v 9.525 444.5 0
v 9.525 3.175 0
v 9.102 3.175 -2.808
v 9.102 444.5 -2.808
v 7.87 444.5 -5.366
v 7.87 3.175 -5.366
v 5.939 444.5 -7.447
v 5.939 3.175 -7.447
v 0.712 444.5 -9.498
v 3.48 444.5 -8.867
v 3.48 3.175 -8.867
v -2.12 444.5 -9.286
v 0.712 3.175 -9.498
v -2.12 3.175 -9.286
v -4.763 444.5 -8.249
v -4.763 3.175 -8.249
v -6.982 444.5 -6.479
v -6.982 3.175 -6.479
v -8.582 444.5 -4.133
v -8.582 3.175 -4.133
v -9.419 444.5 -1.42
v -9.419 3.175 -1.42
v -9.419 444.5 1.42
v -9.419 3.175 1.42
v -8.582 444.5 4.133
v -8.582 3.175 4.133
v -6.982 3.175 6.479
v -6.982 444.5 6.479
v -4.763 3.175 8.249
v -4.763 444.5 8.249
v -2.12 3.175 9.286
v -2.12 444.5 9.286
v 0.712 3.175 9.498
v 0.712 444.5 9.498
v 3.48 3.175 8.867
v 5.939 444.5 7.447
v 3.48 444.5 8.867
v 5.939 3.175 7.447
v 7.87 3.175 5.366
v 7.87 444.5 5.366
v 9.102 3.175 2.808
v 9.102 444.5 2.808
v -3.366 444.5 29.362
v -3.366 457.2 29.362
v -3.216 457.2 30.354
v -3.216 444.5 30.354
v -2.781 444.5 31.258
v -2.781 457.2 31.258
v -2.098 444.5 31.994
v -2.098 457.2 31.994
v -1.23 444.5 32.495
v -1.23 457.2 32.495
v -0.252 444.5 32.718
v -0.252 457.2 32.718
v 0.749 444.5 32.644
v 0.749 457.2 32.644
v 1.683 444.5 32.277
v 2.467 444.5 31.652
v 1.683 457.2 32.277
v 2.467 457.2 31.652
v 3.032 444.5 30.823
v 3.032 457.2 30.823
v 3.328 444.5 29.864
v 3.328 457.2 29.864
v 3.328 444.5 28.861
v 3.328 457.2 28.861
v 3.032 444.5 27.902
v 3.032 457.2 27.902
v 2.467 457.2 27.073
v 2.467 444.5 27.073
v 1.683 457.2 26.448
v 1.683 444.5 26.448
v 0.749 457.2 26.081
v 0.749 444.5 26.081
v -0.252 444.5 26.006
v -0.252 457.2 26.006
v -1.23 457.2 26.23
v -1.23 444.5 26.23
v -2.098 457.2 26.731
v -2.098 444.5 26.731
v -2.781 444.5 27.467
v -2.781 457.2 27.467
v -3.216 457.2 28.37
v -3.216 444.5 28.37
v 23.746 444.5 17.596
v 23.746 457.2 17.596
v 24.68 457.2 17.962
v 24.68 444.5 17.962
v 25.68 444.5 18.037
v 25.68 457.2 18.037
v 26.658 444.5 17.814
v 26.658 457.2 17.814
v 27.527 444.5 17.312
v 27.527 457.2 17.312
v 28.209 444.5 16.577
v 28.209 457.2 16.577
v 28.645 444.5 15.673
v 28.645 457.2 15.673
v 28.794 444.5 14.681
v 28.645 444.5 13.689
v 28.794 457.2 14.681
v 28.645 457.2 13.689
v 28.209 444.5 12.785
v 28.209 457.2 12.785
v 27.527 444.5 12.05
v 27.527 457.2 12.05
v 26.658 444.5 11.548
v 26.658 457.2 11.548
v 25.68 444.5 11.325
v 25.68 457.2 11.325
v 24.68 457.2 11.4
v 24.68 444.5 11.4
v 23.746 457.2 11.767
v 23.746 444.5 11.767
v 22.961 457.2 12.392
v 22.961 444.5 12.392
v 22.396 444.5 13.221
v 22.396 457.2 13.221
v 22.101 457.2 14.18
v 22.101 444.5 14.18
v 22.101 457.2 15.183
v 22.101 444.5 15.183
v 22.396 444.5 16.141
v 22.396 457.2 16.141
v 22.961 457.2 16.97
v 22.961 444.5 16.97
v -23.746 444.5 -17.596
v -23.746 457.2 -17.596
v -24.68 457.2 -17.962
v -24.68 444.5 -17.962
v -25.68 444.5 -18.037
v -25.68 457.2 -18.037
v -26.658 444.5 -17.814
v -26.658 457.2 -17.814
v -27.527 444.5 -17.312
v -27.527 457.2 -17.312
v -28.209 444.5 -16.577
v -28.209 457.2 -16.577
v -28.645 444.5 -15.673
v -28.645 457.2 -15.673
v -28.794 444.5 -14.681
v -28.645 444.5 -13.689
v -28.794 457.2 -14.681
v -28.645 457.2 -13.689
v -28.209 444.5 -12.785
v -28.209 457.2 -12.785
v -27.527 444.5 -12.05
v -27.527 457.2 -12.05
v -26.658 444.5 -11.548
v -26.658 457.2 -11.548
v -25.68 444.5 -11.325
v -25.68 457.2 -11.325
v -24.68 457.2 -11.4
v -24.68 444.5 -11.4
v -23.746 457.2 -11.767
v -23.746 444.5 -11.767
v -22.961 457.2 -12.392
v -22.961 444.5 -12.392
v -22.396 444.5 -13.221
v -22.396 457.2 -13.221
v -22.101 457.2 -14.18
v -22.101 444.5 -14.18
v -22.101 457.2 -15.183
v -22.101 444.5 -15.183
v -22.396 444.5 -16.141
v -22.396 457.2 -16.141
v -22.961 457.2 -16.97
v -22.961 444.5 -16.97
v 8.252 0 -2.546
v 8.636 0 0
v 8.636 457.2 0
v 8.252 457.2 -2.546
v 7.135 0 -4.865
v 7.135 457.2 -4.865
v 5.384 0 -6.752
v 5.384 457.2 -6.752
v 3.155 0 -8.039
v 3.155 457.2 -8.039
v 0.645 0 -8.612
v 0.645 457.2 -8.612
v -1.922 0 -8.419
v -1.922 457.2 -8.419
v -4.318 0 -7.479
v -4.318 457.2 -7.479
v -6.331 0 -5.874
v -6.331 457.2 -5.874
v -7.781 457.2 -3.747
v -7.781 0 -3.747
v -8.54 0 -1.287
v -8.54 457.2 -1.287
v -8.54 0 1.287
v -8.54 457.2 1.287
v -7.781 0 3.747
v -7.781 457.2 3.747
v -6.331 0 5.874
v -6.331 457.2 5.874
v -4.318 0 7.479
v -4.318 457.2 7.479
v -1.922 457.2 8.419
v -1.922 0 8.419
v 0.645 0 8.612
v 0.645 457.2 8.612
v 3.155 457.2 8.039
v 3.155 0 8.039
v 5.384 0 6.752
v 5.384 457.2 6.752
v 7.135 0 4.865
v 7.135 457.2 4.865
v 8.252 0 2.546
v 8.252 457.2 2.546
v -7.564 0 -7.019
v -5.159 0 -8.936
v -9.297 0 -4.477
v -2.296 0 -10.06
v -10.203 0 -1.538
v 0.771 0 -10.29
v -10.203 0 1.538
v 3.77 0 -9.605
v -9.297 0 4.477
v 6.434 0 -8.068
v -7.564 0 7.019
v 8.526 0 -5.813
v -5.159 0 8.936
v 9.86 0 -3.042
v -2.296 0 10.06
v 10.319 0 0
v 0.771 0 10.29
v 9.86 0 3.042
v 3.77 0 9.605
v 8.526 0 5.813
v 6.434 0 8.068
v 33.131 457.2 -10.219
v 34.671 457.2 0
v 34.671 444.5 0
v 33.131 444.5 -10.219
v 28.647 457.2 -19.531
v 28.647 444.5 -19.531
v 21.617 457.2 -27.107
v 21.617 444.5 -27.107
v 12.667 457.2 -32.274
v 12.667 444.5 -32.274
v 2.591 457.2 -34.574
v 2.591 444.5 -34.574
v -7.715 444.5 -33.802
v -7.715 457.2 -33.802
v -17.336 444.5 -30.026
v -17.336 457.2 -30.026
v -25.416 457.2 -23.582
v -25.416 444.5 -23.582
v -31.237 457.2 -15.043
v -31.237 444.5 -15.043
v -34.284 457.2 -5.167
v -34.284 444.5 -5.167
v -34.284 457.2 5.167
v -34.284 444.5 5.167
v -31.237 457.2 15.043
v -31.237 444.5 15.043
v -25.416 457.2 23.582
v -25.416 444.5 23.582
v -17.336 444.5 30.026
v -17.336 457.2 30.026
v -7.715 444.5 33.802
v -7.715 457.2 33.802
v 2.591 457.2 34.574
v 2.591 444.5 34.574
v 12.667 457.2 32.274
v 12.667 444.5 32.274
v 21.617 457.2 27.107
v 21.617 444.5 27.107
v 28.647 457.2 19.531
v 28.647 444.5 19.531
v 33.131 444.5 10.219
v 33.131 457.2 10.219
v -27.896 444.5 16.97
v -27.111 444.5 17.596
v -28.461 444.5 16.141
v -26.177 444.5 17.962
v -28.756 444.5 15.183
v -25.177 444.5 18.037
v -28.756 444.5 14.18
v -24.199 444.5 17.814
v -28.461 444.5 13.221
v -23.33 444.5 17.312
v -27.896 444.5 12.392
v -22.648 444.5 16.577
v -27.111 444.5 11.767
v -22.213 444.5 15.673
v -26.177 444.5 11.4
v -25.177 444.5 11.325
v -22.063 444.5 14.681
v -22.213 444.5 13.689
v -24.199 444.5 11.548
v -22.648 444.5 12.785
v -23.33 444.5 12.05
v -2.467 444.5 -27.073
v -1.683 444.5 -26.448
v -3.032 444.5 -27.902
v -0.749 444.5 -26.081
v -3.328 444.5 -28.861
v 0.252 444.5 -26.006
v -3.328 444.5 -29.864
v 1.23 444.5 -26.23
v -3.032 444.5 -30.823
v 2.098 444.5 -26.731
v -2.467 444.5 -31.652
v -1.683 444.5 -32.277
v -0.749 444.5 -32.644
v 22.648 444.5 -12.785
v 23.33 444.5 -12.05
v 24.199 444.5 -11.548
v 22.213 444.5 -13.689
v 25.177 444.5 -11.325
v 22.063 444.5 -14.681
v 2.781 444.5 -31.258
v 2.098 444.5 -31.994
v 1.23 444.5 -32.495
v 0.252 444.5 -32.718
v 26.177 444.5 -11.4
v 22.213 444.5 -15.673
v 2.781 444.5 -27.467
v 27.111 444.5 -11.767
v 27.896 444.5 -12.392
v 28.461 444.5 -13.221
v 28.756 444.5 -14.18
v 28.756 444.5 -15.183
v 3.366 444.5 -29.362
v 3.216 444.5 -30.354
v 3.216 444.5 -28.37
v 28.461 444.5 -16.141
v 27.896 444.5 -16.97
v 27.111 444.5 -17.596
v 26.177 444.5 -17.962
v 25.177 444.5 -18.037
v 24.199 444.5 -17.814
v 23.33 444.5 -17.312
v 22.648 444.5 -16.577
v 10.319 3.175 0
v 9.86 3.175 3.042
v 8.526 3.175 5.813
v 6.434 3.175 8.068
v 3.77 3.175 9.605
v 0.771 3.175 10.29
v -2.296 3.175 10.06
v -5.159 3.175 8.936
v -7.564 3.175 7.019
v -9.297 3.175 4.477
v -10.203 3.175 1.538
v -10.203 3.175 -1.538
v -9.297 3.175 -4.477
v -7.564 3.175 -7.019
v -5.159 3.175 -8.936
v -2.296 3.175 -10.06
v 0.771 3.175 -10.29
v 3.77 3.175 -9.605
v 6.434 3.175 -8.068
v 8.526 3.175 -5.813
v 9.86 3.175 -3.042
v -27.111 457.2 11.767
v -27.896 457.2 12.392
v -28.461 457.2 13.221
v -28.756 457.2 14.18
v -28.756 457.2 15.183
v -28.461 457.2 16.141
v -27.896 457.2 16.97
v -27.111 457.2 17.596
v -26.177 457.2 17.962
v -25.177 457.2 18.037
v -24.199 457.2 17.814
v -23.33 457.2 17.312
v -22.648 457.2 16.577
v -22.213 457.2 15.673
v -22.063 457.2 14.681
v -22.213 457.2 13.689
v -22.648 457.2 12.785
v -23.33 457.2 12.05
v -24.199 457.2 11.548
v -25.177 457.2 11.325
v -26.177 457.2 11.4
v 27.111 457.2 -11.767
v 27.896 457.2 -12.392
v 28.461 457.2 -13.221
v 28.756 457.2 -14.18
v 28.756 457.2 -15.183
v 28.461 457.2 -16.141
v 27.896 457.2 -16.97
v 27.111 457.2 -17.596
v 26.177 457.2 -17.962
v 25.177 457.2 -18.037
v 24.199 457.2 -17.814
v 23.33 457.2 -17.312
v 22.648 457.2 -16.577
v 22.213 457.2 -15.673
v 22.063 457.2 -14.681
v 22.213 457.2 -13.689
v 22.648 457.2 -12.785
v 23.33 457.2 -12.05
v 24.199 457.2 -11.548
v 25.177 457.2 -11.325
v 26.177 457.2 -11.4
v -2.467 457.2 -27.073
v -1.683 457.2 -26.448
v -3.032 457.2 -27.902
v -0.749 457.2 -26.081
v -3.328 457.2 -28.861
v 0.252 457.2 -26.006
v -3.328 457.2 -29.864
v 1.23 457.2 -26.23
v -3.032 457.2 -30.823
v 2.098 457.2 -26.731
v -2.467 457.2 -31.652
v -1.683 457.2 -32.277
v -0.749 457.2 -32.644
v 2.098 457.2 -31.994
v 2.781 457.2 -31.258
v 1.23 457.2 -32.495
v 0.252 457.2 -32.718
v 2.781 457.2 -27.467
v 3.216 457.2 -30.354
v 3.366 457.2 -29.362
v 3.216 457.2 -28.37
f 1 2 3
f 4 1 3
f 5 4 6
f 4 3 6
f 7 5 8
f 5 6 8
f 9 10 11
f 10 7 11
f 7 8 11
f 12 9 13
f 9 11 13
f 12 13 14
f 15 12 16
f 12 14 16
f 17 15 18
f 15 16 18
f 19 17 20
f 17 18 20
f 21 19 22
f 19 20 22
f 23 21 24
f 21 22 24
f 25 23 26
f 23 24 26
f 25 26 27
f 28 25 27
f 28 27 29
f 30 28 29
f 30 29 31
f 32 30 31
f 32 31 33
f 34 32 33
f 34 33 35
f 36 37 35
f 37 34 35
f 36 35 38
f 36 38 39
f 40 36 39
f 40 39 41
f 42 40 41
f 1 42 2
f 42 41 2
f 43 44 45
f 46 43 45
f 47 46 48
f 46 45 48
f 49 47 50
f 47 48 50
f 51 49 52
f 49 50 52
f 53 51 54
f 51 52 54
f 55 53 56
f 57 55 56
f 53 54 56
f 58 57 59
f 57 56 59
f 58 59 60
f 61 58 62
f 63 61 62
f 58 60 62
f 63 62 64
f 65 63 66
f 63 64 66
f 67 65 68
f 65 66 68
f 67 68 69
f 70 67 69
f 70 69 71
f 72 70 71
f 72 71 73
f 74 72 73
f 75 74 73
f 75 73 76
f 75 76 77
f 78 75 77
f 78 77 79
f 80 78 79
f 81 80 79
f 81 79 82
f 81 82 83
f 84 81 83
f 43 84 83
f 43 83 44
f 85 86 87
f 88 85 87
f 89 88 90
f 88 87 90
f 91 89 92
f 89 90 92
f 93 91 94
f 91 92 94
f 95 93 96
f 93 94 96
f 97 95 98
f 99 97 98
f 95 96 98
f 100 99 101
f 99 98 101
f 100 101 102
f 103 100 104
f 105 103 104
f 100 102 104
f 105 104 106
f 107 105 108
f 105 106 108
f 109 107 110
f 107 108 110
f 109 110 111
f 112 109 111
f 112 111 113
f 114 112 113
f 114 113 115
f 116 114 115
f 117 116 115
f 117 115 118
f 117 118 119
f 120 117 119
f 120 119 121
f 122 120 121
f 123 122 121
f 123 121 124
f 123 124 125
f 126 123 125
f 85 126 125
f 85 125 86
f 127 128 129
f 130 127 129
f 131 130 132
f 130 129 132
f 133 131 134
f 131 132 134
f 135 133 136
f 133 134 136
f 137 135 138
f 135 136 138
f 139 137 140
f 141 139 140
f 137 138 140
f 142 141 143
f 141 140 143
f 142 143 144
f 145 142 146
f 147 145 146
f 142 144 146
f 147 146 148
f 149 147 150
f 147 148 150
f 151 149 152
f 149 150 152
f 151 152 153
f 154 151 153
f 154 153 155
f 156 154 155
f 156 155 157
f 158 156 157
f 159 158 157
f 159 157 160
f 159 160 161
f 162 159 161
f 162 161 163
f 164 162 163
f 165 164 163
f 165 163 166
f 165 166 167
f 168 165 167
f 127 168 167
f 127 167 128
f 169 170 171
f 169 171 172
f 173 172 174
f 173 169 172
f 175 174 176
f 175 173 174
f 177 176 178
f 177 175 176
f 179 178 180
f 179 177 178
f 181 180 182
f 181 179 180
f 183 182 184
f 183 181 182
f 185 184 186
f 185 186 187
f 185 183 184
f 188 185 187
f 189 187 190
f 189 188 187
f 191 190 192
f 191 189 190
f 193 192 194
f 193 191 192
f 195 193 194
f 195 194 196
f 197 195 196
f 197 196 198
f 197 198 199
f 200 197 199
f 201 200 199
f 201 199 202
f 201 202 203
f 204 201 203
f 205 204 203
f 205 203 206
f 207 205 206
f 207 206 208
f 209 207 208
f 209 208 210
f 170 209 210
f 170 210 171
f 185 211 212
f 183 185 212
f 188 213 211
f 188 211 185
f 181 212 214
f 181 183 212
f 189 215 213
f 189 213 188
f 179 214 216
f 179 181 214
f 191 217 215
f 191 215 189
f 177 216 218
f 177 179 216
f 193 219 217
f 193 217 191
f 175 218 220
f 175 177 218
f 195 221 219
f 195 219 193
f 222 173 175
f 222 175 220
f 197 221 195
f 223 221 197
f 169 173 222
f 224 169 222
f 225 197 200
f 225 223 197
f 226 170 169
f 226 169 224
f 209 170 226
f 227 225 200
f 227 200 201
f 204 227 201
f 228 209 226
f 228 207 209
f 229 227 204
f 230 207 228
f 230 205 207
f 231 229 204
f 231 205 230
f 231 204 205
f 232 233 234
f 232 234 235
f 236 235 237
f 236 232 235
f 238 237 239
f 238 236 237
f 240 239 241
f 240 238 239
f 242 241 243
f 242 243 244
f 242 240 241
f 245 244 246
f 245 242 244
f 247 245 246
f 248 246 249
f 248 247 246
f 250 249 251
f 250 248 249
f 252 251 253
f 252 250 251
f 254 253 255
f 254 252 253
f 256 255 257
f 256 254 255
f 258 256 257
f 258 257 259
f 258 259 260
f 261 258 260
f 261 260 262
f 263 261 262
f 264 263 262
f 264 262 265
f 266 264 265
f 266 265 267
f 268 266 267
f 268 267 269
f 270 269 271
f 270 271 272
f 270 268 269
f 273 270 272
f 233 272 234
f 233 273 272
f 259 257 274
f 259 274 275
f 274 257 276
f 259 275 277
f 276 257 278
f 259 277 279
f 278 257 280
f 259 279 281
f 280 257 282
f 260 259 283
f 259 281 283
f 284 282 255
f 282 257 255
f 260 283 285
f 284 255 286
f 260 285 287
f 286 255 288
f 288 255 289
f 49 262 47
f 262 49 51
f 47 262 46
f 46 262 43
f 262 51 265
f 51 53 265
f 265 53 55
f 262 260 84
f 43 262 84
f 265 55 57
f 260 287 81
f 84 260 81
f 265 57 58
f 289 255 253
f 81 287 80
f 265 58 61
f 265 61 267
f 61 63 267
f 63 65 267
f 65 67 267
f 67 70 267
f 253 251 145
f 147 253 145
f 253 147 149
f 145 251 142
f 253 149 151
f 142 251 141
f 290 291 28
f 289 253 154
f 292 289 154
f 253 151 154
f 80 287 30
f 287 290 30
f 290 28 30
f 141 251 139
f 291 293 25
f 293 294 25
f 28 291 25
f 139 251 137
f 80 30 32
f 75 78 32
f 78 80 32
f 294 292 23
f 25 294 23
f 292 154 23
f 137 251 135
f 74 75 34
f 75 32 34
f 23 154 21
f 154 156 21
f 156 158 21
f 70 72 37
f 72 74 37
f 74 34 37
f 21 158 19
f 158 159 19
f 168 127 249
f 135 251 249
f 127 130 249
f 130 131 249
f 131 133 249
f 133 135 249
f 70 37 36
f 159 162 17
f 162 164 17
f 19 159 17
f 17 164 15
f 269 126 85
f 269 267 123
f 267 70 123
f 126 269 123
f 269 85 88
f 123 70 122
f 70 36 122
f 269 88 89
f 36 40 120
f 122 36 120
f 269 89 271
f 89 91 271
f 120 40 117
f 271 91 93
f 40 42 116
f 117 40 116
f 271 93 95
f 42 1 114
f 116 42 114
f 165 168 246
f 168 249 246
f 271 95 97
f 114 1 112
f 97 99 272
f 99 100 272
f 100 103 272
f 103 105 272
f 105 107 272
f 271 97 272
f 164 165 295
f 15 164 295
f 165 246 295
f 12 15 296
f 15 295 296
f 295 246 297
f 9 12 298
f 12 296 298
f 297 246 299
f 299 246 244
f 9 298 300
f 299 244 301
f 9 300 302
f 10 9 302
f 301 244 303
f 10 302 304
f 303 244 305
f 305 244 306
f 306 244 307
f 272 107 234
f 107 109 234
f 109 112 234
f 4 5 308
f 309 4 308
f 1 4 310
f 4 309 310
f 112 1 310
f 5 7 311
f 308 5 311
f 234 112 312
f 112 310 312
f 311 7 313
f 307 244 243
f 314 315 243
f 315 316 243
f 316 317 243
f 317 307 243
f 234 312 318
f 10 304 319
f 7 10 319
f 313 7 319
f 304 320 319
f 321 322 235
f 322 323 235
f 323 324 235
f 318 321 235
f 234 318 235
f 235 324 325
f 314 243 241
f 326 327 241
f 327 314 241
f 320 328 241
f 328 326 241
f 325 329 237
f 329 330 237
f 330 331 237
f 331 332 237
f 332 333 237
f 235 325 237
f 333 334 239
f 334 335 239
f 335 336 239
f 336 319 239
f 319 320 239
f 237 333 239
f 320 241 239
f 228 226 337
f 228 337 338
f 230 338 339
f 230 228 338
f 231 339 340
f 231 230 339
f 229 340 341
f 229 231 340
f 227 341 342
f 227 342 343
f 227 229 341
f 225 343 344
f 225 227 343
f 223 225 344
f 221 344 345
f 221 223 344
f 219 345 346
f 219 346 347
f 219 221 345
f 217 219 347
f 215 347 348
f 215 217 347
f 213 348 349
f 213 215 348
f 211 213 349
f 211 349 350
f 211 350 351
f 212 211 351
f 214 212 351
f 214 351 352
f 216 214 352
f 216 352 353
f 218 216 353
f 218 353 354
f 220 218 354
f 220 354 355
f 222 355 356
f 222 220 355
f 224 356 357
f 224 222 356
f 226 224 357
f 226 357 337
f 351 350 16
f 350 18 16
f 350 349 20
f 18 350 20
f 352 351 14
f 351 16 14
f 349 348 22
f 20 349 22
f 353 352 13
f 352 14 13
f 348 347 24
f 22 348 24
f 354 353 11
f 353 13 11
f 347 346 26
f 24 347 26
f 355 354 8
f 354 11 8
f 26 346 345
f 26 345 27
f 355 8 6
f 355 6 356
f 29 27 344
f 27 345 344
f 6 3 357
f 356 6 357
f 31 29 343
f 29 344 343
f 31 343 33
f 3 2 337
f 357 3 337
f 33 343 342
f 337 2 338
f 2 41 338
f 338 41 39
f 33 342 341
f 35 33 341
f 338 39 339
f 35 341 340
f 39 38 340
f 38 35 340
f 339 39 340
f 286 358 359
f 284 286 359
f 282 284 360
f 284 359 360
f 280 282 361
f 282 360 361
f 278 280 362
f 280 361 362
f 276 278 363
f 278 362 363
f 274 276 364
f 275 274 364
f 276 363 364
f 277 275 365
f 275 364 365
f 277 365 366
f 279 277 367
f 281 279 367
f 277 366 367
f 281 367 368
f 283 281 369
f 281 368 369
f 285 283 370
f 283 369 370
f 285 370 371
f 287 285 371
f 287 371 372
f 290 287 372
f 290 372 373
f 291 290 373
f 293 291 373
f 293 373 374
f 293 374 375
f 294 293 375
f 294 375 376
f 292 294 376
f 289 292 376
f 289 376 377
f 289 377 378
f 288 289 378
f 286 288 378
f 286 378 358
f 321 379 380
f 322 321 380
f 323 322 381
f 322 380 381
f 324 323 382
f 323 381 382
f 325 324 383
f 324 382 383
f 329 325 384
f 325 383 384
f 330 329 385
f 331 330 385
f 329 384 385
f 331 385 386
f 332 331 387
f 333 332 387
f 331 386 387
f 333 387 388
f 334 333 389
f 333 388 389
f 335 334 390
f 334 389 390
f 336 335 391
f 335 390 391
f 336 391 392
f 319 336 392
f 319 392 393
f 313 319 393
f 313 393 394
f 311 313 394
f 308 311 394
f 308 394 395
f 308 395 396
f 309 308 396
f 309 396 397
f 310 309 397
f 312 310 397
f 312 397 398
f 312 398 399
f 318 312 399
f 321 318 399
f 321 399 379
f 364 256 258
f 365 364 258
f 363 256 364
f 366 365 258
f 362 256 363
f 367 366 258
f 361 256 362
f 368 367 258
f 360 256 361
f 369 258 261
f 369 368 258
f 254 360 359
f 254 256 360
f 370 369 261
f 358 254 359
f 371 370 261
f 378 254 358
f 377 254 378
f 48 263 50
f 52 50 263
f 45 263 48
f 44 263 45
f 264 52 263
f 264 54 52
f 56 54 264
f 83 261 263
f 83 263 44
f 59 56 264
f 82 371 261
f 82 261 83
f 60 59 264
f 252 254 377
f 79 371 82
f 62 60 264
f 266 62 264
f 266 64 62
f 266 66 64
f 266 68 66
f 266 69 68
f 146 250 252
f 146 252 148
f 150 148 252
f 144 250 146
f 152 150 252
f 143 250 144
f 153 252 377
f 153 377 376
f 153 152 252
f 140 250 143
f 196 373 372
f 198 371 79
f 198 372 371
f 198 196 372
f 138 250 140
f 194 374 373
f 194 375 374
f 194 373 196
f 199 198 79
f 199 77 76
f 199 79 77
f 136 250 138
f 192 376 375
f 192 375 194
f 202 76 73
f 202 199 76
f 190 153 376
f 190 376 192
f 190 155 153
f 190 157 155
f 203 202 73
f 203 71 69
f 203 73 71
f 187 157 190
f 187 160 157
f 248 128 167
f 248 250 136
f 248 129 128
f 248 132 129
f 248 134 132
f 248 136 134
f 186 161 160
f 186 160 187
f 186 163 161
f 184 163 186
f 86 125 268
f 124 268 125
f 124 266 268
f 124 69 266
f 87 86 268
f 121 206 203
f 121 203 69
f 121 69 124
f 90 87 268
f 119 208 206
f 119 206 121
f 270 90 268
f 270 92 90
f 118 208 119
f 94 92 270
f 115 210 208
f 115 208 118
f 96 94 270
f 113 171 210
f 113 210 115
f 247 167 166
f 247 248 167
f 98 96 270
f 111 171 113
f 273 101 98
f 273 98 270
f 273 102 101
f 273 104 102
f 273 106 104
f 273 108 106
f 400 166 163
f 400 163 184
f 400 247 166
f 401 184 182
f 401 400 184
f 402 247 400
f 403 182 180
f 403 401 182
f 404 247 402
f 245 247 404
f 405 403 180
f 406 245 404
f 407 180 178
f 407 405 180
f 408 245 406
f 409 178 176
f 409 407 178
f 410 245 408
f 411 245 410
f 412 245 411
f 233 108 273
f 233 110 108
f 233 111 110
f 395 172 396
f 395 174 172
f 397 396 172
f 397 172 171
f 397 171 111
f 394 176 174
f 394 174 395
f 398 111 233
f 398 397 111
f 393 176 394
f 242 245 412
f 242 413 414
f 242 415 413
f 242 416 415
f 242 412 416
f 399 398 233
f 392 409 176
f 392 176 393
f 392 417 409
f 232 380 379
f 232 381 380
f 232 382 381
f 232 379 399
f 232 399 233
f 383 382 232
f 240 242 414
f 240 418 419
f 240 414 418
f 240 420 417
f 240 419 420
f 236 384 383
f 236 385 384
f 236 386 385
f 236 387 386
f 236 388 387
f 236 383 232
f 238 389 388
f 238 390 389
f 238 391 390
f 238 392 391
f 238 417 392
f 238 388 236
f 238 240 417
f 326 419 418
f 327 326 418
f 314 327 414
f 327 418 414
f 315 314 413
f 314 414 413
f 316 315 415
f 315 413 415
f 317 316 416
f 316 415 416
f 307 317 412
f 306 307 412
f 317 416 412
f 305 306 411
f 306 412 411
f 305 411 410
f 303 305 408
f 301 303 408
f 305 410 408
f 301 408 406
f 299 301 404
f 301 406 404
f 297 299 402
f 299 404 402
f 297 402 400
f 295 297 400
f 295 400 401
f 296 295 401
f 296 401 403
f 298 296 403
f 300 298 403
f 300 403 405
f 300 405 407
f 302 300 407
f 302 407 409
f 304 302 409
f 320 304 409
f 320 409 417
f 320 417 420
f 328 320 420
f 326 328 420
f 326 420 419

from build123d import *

# Parameters (mm, degrees)
SKETCH1_R         = 9.525
SKETCH1_R_2       = 8.636
EXTRUDE1_DEPTH    = 457.2
SKETCH2_R         = 34.671
SKETCH2_R_2       = 8.636
EXTRUDE2_DEPTH    = 12.7
SKETCH3_R         = 3.3655
EXTRUDE3_DEPTH    = 458.2
CIRPATTERN1_COUNT = 6
SKETCH4_R         = 10.31875
SKETCH4_R_2       = 8.636
EXTRUDE4_DEPTH    = 3.175


with BuildPart() as part:
    # Sketch1 → Extrude1 (new body)
    with BuildSketch(Plane(origin=(0, 0, 0), x_dir=(1, 0, 0), z_dir=(0, 1, 0))):
        Circle(SKETCH1_R)
        Circle(SKETCH1_R_2, mode=Mode.SUBTRACT)
    extrude(amount=EXTRUDE1_DEPTH)

    # Sketch2 → Extrude2 (add)
    with BuildSketch(Plane(origin=(0, 457.2, 0), x_dir=(1, 0, 0), z_dir=(0, 1, 0))):
        Circle(SKETCH2_R)
        Circle(SKETCH2_R_2, mode=Mode.SUBTRACT)
    extrude(amount=-EXTRUDE2_DEPTH)

    # Sketch3 → Extrude3 (cut, through all)
    with BuildSketch(Plane(origin=(0, 457.2, 0), x_dir=(1, 0, 0), z_dir=(0, 1, 0))):
        with Locations((0, 29.3624)):
            Circle(SKETCH3_R)
    extrude3 = extrude(amount=-EXTRUDE3_DEPTH, mode=Mode.SUBTRACT)

    # CirPattern1: Extrude3 ×6 about axis
    cirpattern1_axis = Axis((0, 0, 0), (0, 1, 0))
    for i in range(1, CIRPATTERN1_COUNT):
        add(extrude3.rotate(cirpattern1_axis, i * 360 / CIRPATTERN1_COUNT), mode=Mode.SUBTRACT)

    # Sketch4 → Extrude4 (add)
    with BuildSketch(Plane.XZ):
        Circle(SKETCH4_R)
        Circle(SKETCH4_R_2, mode=Mode.SUBTRACT)
    extrude(amount=-EXTRUDE4_DEPTH)


solid = part.part
